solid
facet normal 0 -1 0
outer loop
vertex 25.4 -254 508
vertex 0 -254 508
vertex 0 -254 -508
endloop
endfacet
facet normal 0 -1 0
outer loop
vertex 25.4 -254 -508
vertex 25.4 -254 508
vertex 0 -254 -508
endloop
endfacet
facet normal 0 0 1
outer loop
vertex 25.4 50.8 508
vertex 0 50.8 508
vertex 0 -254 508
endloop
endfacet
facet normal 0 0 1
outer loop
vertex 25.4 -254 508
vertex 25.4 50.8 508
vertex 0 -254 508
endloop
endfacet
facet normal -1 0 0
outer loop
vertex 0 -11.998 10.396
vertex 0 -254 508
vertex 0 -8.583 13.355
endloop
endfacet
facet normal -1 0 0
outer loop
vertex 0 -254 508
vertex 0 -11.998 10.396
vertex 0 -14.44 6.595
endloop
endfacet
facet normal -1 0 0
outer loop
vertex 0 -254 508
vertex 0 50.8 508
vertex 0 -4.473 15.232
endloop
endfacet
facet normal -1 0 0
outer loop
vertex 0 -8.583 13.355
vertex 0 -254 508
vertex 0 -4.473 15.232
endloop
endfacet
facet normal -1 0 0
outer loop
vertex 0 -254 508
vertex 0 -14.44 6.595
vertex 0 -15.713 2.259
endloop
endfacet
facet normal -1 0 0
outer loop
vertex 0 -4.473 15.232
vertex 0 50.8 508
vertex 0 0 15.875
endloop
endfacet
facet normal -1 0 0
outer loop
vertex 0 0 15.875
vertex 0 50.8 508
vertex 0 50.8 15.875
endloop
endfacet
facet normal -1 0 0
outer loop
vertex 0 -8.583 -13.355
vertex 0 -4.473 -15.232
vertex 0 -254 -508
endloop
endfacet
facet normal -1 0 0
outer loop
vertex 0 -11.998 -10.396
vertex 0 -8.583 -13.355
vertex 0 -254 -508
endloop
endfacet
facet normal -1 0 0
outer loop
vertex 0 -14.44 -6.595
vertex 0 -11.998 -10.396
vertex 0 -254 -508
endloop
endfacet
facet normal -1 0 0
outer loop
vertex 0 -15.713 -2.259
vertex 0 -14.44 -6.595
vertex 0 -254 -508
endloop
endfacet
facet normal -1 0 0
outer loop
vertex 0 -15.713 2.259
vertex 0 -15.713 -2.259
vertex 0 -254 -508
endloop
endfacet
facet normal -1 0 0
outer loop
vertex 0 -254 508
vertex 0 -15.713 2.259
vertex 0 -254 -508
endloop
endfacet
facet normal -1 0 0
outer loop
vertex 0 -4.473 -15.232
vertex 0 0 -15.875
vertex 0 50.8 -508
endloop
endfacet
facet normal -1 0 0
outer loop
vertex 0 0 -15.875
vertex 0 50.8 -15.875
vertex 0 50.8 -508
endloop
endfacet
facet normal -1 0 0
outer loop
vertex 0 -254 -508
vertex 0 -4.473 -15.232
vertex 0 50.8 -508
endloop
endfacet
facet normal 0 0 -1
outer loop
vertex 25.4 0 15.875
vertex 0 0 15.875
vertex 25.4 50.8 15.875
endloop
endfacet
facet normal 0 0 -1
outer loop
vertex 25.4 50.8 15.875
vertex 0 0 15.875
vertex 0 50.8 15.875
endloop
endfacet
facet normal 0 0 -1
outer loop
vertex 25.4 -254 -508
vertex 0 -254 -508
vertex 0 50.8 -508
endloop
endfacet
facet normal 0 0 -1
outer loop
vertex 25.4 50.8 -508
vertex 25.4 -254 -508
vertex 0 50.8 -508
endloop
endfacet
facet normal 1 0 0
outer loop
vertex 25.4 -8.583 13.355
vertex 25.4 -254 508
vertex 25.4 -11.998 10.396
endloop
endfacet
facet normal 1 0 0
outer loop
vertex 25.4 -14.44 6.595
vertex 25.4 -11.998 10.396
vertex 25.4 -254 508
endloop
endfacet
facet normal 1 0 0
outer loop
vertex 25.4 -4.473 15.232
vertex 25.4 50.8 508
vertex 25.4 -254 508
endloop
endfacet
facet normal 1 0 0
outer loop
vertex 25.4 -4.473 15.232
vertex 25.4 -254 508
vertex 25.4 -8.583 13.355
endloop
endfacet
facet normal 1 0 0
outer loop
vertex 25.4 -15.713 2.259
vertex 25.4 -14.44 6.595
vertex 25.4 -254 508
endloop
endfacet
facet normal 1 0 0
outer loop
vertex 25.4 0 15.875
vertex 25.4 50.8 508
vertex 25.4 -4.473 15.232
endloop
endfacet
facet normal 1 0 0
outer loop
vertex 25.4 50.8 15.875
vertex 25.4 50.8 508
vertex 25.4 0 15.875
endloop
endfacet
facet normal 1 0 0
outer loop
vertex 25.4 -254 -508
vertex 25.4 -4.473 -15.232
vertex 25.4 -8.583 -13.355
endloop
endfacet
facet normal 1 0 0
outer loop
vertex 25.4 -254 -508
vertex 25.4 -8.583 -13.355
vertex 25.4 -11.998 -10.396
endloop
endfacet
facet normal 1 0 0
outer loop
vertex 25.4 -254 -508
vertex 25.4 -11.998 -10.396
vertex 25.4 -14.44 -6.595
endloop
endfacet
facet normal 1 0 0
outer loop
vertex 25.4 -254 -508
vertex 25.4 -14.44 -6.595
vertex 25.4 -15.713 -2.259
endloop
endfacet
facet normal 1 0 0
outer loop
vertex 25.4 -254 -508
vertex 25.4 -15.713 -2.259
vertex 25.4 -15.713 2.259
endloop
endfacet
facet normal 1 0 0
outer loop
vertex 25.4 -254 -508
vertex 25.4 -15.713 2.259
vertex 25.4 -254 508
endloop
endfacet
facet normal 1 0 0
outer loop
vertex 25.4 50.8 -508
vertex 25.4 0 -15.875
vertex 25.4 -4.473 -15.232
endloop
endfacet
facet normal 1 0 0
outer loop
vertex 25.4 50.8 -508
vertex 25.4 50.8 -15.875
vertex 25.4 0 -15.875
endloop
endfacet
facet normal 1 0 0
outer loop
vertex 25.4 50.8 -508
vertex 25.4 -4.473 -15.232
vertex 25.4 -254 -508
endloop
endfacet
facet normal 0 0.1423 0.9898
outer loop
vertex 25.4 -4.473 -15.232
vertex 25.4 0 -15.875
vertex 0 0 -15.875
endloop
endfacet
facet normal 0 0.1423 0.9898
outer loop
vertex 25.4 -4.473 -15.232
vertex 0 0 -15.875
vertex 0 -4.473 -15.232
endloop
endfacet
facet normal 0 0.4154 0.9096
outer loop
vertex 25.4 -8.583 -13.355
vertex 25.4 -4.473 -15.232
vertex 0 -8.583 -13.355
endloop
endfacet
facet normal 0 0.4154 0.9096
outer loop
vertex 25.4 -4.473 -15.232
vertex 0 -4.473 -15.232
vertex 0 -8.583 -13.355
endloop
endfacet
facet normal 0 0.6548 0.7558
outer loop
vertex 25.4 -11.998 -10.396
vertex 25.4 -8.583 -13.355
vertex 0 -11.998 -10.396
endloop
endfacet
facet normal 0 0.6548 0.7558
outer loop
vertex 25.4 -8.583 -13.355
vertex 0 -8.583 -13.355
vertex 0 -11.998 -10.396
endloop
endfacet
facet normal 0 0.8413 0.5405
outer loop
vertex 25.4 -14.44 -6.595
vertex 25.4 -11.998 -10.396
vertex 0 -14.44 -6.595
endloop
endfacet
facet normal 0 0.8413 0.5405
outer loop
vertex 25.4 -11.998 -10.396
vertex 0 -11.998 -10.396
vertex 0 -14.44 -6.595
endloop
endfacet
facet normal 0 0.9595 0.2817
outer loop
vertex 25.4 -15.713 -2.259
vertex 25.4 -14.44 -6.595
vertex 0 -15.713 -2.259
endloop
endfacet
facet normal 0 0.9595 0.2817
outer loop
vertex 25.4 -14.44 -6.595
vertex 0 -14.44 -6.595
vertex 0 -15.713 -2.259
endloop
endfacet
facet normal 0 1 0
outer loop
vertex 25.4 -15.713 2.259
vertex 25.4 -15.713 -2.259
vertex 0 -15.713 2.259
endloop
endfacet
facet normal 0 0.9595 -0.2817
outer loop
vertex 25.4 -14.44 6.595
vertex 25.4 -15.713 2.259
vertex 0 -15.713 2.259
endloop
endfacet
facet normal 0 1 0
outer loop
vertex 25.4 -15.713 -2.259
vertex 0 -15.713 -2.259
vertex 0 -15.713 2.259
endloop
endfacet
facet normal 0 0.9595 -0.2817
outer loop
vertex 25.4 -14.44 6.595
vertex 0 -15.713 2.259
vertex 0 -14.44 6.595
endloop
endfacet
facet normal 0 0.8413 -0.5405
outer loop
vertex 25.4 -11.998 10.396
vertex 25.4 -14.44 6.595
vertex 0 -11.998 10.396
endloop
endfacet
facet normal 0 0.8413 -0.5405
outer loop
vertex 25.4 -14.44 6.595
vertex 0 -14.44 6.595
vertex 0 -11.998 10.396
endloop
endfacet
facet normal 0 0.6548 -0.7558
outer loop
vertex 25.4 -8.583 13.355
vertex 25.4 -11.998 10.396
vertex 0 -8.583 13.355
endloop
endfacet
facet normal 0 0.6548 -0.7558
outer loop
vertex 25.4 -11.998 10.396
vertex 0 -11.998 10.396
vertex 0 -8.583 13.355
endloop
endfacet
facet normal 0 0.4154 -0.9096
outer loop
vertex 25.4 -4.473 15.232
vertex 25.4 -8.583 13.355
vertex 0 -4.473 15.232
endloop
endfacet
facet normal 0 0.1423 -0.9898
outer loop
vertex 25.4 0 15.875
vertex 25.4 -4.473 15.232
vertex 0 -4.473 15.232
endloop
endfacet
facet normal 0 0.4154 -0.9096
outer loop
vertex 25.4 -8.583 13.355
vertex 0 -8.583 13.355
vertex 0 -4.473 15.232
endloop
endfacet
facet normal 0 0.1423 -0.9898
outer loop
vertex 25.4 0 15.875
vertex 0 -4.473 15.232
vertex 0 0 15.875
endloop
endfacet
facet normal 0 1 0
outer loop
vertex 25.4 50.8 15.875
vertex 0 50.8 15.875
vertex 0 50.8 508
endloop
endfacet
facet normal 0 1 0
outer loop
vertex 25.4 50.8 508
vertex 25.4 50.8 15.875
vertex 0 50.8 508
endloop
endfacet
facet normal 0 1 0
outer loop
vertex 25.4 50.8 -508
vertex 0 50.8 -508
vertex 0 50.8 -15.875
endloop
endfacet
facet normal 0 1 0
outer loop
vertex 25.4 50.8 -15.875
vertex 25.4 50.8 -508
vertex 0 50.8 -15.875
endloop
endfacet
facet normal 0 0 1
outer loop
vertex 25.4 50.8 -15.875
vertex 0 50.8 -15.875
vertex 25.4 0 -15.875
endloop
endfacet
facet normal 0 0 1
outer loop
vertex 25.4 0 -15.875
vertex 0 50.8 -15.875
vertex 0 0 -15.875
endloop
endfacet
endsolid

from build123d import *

# Parameters (mm, degrees)
BOSS_EXTRUDE1_DEPTH = 25.4


with BuildPart() as part:
    # Sketch1 → Boss-Extrude1 (new body)
    with BuildSketch(Plane(origin=(0, 0, 0), x_dir=(0, 0, -1), z_dir=(1, 0, 0))):
        with BuildLine():
            ThreePointArc((15.875, 0), (0, -15.875), (-15.875, 0))
            Line((-15.875, 0), (-15.875, 50.8))
            Line((-15.875, 50.8), (-508, 50.8))
            Line((-508, 50.8), (-508, -254))
            Line((-508, -254), (508, -254))
            Line((508, -254), (508, 50.8))
            Line((508, 50.8), (15.875, 50.8))
            Line((15.875, 50.8), (15.875, 0))
        make_face()
    extrude(amount=BOSS_EXTRUDE1_DEPTH)


solid = part.part
